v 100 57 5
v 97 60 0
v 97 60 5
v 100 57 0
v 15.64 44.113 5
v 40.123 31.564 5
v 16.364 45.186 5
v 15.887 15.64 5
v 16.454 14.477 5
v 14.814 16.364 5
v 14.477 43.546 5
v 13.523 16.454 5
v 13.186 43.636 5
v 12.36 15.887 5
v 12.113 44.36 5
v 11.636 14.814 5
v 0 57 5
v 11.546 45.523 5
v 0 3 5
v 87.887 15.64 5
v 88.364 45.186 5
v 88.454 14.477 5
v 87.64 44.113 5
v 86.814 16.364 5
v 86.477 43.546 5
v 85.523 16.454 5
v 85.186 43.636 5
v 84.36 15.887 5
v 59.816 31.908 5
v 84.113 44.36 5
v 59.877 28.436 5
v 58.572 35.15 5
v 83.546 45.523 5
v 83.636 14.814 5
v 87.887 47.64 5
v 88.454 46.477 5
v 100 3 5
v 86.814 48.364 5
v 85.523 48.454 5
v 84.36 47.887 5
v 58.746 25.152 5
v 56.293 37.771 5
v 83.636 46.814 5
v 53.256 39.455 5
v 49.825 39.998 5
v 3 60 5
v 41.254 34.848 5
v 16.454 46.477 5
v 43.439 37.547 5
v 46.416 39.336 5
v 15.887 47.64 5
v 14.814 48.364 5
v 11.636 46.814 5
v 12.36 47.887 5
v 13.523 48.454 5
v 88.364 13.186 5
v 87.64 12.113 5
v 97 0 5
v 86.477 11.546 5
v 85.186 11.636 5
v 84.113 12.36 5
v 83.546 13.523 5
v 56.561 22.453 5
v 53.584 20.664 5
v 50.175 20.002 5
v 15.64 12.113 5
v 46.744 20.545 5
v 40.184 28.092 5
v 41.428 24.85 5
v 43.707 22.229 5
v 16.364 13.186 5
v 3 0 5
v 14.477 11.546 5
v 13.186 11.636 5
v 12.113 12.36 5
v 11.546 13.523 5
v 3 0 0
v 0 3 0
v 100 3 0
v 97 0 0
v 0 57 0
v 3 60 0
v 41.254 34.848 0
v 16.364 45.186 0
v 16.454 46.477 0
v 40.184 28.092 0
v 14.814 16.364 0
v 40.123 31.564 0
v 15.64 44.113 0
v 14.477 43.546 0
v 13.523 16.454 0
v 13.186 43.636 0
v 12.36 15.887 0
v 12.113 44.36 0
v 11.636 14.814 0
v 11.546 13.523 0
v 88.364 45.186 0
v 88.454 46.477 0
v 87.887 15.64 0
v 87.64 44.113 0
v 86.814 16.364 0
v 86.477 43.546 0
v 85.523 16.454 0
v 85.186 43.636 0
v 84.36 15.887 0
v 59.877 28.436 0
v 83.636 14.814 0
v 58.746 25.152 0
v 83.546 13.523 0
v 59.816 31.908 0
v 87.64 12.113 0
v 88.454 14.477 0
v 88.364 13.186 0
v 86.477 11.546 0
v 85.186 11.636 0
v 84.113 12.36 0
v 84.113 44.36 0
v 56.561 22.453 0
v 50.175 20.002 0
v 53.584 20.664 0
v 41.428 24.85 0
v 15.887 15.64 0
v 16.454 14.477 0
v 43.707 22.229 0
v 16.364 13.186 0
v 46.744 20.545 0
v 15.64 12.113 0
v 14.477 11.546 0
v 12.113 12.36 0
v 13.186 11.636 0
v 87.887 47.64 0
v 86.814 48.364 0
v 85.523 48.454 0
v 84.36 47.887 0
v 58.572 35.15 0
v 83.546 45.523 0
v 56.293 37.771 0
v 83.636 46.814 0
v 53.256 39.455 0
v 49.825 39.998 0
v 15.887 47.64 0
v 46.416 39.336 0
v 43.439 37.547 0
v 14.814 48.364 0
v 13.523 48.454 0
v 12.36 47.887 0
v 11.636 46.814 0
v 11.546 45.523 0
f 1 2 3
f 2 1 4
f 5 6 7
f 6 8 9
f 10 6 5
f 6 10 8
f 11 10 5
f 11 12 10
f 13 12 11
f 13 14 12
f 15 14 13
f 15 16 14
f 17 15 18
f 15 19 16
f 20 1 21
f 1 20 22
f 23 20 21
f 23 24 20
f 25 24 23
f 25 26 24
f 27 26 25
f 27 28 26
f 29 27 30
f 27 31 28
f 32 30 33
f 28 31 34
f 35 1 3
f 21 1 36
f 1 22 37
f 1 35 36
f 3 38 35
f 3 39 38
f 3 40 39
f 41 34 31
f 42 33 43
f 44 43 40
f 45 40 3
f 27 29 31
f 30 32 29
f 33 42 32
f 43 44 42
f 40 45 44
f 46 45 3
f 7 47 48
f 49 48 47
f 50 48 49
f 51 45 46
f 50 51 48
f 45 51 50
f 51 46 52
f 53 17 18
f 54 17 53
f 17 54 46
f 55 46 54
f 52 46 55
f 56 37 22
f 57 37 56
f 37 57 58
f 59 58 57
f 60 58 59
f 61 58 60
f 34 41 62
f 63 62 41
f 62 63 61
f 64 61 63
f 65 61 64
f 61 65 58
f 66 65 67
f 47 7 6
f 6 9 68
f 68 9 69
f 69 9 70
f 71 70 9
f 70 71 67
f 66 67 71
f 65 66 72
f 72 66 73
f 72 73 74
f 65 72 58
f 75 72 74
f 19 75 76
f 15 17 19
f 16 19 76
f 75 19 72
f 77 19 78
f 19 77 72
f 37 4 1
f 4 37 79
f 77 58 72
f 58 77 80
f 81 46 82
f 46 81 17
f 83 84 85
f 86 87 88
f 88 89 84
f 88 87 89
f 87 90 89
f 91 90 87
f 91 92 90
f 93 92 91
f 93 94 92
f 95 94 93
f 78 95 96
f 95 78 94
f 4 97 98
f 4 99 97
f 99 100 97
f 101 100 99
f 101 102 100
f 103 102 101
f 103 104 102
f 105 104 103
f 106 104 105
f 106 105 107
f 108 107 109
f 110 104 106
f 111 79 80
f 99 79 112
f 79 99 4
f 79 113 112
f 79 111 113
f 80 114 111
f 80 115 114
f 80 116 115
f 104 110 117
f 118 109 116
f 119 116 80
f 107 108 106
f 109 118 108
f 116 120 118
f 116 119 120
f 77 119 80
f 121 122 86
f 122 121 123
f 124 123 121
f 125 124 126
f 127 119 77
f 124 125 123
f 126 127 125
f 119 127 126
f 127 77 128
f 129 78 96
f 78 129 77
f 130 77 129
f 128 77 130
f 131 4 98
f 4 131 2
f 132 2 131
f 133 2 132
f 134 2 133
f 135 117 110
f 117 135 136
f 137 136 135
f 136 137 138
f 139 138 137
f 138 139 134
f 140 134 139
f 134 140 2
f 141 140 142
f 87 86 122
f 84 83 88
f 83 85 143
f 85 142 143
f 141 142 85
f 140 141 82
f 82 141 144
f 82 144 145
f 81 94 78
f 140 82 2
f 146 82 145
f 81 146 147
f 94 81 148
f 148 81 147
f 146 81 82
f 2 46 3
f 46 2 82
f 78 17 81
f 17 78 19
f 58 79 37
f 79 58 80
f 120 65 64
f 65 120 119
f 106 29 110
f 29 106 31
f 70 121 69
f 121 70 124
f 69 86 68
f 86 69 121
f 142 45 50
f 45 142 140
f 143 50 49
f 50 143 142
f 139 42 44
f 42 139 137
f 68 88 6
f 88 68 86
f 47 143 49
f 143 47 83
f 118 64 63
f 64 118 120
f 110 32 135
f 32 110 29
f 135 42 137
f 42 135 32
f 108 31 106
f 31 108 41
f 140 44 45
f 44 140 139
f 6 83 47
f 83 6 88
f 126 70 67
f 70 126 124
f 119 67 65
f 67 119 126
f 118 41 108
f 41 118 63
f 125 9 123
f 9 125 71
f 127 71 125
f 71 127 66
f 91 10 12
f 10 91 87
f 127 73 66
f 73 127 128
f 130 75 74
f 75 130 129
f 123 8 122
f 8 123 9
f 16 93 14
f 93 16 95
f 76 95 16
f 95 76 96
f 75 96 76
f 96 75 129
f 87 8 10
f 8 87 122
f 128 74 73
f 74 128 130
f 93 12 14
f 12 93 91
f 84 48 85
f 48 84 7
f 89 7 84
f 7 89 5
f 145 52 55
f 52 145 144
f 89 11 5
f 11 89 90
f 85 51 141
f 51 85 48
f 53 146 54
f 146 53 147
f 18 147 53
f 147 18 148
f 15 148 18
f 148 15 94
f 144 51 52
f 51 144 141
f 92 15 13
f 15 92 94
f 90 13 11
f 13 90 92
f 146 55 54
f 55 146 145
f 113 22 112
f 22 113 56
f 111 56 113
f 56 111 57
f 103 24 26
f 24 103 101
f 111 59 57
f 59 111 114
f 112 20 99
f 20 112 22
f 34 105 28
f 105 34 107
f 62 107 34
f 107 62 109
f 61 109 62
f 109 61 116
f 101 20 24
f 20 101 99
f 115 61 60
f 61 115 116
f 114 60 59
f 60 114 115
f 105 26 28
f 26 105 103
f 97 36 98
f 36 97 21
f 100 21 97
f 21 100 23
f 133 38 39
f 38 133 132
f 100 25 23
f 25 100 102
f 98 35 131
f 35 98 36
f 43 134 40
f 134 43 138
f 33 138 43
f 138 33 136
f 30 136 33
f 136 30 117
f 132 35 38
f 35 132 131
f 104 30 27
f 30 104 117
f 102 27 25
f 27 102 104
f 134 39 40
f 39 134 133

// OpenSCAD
$fn = 32;

// ----------------------------------------------------------------------
// Spacer plate: rect 100 x 60
// ----------------------------------------------------------------------

// --- parameters (mm) ---
bore_r = 10;              // centre bore radius
bolt_r = 2.5;             // bolt hole radius
plate_t = 5;              // plate thickness, Z (extrusion height)
plate_l = 100;            // plate length, X
plate_w = 60;             // plate width, Y
inset = 14;               // corner hole inset
fit_tol = 0.02;           // declared fit tolerance (prompt contract)
free_tol = 0.2;           // declared free tolerance (prompt contract)

profile = [[3, 0], [97, 0], [100, 3], [100, 57], [97, 60], [3, 60], [0, 57], [0, 3]];  // primary outline, 8 points, counter clockwise
void_1 = [[59.816, 31.908], [58.572, 35.15], [56.293, 37.771], [53.256, 39.455], [49.825, 39.998], [46.416, 39.336], [43.439, 37.547], [41.254, 34.848], [40.123, 31.564], [40.184, 28.092], [41.428, 24.85], [43.707, 22.229], [46.744, 20.545], [50.175, 20.002], [53.584, 20.664], [56.561, 22.453], [58.746, 25.152], [59.877, 28.436]];  // centre bore, 18 points
void_2 = [[16.454, 14.477], [15.887, 15.64], [14.814, 16.364], [13.523, 16.454], [12.36, 15.887], [11.636, 14.814], [11.546, 13.523], [12.113, 12.36], [13.186, 11.636], [14.477, 11.546], [15.64, 12.113], [16.364, 13.186]];  // corner hole, 12 points
void_3 = [[16.454, 46.477], [15.887, 47.64], [14.814, 48.364], [13.523, 48.454], [12.36, 47.887], [11.636, 46.814], [11.546, 45.523], [12.113, 44.36], [13.186, 43.636], [14.477, 43.546], [15.64, 44.113], [16.364, 45.186]];  // corner hole, 12 points
void_4 = [[88.454, 14.477], [87.887, 15.64], [86.814, 16.364], [85.523, 16.454], [84.36, 15.887], [83.636, 14.814], [83.546, 13.523], [84.113, 12.36], [85.186, 11.636], [86.477, 11.546], [87.64, 12.113], [88.364, 13.186]];  // corner hole, 12 points
void_5 = [[88.454, 46.477], [87.887, 47.64], [86.814, 48.364], [85.523, 48.454], [84.36, 47.887], [83.636, 46.814], [83.546, 45.523], [84.113, 44.36], [85.186, 43.636], [86.477, 43.546], [87.64, 44.113], [88.364, 45.186]];  // corner hole, 12 points

// --- the one profile operation ---
difference() {
  linear_extrude(height = plate_t) polygon(points = profile);
  translate([0, 0, -1])
    linear_extrude(height = plate_t + 2) polygon(points = void_1);
  translate([0, 0, -1])
    linear_extrude(height = plate_t + 2) polygon(points = void_2);
  translate([0, 0, -1])
    linear_extrude(height = plate_t + 2) polygon(points = void_3);
  translate([0, 0, -1])
    linear_extrude(height = plate_t + 2) polygon(points = void_4);
  translate([0, 0, -1])
    linear_extrude(height = plate_t + 2) polygon(points = void_5);
}
